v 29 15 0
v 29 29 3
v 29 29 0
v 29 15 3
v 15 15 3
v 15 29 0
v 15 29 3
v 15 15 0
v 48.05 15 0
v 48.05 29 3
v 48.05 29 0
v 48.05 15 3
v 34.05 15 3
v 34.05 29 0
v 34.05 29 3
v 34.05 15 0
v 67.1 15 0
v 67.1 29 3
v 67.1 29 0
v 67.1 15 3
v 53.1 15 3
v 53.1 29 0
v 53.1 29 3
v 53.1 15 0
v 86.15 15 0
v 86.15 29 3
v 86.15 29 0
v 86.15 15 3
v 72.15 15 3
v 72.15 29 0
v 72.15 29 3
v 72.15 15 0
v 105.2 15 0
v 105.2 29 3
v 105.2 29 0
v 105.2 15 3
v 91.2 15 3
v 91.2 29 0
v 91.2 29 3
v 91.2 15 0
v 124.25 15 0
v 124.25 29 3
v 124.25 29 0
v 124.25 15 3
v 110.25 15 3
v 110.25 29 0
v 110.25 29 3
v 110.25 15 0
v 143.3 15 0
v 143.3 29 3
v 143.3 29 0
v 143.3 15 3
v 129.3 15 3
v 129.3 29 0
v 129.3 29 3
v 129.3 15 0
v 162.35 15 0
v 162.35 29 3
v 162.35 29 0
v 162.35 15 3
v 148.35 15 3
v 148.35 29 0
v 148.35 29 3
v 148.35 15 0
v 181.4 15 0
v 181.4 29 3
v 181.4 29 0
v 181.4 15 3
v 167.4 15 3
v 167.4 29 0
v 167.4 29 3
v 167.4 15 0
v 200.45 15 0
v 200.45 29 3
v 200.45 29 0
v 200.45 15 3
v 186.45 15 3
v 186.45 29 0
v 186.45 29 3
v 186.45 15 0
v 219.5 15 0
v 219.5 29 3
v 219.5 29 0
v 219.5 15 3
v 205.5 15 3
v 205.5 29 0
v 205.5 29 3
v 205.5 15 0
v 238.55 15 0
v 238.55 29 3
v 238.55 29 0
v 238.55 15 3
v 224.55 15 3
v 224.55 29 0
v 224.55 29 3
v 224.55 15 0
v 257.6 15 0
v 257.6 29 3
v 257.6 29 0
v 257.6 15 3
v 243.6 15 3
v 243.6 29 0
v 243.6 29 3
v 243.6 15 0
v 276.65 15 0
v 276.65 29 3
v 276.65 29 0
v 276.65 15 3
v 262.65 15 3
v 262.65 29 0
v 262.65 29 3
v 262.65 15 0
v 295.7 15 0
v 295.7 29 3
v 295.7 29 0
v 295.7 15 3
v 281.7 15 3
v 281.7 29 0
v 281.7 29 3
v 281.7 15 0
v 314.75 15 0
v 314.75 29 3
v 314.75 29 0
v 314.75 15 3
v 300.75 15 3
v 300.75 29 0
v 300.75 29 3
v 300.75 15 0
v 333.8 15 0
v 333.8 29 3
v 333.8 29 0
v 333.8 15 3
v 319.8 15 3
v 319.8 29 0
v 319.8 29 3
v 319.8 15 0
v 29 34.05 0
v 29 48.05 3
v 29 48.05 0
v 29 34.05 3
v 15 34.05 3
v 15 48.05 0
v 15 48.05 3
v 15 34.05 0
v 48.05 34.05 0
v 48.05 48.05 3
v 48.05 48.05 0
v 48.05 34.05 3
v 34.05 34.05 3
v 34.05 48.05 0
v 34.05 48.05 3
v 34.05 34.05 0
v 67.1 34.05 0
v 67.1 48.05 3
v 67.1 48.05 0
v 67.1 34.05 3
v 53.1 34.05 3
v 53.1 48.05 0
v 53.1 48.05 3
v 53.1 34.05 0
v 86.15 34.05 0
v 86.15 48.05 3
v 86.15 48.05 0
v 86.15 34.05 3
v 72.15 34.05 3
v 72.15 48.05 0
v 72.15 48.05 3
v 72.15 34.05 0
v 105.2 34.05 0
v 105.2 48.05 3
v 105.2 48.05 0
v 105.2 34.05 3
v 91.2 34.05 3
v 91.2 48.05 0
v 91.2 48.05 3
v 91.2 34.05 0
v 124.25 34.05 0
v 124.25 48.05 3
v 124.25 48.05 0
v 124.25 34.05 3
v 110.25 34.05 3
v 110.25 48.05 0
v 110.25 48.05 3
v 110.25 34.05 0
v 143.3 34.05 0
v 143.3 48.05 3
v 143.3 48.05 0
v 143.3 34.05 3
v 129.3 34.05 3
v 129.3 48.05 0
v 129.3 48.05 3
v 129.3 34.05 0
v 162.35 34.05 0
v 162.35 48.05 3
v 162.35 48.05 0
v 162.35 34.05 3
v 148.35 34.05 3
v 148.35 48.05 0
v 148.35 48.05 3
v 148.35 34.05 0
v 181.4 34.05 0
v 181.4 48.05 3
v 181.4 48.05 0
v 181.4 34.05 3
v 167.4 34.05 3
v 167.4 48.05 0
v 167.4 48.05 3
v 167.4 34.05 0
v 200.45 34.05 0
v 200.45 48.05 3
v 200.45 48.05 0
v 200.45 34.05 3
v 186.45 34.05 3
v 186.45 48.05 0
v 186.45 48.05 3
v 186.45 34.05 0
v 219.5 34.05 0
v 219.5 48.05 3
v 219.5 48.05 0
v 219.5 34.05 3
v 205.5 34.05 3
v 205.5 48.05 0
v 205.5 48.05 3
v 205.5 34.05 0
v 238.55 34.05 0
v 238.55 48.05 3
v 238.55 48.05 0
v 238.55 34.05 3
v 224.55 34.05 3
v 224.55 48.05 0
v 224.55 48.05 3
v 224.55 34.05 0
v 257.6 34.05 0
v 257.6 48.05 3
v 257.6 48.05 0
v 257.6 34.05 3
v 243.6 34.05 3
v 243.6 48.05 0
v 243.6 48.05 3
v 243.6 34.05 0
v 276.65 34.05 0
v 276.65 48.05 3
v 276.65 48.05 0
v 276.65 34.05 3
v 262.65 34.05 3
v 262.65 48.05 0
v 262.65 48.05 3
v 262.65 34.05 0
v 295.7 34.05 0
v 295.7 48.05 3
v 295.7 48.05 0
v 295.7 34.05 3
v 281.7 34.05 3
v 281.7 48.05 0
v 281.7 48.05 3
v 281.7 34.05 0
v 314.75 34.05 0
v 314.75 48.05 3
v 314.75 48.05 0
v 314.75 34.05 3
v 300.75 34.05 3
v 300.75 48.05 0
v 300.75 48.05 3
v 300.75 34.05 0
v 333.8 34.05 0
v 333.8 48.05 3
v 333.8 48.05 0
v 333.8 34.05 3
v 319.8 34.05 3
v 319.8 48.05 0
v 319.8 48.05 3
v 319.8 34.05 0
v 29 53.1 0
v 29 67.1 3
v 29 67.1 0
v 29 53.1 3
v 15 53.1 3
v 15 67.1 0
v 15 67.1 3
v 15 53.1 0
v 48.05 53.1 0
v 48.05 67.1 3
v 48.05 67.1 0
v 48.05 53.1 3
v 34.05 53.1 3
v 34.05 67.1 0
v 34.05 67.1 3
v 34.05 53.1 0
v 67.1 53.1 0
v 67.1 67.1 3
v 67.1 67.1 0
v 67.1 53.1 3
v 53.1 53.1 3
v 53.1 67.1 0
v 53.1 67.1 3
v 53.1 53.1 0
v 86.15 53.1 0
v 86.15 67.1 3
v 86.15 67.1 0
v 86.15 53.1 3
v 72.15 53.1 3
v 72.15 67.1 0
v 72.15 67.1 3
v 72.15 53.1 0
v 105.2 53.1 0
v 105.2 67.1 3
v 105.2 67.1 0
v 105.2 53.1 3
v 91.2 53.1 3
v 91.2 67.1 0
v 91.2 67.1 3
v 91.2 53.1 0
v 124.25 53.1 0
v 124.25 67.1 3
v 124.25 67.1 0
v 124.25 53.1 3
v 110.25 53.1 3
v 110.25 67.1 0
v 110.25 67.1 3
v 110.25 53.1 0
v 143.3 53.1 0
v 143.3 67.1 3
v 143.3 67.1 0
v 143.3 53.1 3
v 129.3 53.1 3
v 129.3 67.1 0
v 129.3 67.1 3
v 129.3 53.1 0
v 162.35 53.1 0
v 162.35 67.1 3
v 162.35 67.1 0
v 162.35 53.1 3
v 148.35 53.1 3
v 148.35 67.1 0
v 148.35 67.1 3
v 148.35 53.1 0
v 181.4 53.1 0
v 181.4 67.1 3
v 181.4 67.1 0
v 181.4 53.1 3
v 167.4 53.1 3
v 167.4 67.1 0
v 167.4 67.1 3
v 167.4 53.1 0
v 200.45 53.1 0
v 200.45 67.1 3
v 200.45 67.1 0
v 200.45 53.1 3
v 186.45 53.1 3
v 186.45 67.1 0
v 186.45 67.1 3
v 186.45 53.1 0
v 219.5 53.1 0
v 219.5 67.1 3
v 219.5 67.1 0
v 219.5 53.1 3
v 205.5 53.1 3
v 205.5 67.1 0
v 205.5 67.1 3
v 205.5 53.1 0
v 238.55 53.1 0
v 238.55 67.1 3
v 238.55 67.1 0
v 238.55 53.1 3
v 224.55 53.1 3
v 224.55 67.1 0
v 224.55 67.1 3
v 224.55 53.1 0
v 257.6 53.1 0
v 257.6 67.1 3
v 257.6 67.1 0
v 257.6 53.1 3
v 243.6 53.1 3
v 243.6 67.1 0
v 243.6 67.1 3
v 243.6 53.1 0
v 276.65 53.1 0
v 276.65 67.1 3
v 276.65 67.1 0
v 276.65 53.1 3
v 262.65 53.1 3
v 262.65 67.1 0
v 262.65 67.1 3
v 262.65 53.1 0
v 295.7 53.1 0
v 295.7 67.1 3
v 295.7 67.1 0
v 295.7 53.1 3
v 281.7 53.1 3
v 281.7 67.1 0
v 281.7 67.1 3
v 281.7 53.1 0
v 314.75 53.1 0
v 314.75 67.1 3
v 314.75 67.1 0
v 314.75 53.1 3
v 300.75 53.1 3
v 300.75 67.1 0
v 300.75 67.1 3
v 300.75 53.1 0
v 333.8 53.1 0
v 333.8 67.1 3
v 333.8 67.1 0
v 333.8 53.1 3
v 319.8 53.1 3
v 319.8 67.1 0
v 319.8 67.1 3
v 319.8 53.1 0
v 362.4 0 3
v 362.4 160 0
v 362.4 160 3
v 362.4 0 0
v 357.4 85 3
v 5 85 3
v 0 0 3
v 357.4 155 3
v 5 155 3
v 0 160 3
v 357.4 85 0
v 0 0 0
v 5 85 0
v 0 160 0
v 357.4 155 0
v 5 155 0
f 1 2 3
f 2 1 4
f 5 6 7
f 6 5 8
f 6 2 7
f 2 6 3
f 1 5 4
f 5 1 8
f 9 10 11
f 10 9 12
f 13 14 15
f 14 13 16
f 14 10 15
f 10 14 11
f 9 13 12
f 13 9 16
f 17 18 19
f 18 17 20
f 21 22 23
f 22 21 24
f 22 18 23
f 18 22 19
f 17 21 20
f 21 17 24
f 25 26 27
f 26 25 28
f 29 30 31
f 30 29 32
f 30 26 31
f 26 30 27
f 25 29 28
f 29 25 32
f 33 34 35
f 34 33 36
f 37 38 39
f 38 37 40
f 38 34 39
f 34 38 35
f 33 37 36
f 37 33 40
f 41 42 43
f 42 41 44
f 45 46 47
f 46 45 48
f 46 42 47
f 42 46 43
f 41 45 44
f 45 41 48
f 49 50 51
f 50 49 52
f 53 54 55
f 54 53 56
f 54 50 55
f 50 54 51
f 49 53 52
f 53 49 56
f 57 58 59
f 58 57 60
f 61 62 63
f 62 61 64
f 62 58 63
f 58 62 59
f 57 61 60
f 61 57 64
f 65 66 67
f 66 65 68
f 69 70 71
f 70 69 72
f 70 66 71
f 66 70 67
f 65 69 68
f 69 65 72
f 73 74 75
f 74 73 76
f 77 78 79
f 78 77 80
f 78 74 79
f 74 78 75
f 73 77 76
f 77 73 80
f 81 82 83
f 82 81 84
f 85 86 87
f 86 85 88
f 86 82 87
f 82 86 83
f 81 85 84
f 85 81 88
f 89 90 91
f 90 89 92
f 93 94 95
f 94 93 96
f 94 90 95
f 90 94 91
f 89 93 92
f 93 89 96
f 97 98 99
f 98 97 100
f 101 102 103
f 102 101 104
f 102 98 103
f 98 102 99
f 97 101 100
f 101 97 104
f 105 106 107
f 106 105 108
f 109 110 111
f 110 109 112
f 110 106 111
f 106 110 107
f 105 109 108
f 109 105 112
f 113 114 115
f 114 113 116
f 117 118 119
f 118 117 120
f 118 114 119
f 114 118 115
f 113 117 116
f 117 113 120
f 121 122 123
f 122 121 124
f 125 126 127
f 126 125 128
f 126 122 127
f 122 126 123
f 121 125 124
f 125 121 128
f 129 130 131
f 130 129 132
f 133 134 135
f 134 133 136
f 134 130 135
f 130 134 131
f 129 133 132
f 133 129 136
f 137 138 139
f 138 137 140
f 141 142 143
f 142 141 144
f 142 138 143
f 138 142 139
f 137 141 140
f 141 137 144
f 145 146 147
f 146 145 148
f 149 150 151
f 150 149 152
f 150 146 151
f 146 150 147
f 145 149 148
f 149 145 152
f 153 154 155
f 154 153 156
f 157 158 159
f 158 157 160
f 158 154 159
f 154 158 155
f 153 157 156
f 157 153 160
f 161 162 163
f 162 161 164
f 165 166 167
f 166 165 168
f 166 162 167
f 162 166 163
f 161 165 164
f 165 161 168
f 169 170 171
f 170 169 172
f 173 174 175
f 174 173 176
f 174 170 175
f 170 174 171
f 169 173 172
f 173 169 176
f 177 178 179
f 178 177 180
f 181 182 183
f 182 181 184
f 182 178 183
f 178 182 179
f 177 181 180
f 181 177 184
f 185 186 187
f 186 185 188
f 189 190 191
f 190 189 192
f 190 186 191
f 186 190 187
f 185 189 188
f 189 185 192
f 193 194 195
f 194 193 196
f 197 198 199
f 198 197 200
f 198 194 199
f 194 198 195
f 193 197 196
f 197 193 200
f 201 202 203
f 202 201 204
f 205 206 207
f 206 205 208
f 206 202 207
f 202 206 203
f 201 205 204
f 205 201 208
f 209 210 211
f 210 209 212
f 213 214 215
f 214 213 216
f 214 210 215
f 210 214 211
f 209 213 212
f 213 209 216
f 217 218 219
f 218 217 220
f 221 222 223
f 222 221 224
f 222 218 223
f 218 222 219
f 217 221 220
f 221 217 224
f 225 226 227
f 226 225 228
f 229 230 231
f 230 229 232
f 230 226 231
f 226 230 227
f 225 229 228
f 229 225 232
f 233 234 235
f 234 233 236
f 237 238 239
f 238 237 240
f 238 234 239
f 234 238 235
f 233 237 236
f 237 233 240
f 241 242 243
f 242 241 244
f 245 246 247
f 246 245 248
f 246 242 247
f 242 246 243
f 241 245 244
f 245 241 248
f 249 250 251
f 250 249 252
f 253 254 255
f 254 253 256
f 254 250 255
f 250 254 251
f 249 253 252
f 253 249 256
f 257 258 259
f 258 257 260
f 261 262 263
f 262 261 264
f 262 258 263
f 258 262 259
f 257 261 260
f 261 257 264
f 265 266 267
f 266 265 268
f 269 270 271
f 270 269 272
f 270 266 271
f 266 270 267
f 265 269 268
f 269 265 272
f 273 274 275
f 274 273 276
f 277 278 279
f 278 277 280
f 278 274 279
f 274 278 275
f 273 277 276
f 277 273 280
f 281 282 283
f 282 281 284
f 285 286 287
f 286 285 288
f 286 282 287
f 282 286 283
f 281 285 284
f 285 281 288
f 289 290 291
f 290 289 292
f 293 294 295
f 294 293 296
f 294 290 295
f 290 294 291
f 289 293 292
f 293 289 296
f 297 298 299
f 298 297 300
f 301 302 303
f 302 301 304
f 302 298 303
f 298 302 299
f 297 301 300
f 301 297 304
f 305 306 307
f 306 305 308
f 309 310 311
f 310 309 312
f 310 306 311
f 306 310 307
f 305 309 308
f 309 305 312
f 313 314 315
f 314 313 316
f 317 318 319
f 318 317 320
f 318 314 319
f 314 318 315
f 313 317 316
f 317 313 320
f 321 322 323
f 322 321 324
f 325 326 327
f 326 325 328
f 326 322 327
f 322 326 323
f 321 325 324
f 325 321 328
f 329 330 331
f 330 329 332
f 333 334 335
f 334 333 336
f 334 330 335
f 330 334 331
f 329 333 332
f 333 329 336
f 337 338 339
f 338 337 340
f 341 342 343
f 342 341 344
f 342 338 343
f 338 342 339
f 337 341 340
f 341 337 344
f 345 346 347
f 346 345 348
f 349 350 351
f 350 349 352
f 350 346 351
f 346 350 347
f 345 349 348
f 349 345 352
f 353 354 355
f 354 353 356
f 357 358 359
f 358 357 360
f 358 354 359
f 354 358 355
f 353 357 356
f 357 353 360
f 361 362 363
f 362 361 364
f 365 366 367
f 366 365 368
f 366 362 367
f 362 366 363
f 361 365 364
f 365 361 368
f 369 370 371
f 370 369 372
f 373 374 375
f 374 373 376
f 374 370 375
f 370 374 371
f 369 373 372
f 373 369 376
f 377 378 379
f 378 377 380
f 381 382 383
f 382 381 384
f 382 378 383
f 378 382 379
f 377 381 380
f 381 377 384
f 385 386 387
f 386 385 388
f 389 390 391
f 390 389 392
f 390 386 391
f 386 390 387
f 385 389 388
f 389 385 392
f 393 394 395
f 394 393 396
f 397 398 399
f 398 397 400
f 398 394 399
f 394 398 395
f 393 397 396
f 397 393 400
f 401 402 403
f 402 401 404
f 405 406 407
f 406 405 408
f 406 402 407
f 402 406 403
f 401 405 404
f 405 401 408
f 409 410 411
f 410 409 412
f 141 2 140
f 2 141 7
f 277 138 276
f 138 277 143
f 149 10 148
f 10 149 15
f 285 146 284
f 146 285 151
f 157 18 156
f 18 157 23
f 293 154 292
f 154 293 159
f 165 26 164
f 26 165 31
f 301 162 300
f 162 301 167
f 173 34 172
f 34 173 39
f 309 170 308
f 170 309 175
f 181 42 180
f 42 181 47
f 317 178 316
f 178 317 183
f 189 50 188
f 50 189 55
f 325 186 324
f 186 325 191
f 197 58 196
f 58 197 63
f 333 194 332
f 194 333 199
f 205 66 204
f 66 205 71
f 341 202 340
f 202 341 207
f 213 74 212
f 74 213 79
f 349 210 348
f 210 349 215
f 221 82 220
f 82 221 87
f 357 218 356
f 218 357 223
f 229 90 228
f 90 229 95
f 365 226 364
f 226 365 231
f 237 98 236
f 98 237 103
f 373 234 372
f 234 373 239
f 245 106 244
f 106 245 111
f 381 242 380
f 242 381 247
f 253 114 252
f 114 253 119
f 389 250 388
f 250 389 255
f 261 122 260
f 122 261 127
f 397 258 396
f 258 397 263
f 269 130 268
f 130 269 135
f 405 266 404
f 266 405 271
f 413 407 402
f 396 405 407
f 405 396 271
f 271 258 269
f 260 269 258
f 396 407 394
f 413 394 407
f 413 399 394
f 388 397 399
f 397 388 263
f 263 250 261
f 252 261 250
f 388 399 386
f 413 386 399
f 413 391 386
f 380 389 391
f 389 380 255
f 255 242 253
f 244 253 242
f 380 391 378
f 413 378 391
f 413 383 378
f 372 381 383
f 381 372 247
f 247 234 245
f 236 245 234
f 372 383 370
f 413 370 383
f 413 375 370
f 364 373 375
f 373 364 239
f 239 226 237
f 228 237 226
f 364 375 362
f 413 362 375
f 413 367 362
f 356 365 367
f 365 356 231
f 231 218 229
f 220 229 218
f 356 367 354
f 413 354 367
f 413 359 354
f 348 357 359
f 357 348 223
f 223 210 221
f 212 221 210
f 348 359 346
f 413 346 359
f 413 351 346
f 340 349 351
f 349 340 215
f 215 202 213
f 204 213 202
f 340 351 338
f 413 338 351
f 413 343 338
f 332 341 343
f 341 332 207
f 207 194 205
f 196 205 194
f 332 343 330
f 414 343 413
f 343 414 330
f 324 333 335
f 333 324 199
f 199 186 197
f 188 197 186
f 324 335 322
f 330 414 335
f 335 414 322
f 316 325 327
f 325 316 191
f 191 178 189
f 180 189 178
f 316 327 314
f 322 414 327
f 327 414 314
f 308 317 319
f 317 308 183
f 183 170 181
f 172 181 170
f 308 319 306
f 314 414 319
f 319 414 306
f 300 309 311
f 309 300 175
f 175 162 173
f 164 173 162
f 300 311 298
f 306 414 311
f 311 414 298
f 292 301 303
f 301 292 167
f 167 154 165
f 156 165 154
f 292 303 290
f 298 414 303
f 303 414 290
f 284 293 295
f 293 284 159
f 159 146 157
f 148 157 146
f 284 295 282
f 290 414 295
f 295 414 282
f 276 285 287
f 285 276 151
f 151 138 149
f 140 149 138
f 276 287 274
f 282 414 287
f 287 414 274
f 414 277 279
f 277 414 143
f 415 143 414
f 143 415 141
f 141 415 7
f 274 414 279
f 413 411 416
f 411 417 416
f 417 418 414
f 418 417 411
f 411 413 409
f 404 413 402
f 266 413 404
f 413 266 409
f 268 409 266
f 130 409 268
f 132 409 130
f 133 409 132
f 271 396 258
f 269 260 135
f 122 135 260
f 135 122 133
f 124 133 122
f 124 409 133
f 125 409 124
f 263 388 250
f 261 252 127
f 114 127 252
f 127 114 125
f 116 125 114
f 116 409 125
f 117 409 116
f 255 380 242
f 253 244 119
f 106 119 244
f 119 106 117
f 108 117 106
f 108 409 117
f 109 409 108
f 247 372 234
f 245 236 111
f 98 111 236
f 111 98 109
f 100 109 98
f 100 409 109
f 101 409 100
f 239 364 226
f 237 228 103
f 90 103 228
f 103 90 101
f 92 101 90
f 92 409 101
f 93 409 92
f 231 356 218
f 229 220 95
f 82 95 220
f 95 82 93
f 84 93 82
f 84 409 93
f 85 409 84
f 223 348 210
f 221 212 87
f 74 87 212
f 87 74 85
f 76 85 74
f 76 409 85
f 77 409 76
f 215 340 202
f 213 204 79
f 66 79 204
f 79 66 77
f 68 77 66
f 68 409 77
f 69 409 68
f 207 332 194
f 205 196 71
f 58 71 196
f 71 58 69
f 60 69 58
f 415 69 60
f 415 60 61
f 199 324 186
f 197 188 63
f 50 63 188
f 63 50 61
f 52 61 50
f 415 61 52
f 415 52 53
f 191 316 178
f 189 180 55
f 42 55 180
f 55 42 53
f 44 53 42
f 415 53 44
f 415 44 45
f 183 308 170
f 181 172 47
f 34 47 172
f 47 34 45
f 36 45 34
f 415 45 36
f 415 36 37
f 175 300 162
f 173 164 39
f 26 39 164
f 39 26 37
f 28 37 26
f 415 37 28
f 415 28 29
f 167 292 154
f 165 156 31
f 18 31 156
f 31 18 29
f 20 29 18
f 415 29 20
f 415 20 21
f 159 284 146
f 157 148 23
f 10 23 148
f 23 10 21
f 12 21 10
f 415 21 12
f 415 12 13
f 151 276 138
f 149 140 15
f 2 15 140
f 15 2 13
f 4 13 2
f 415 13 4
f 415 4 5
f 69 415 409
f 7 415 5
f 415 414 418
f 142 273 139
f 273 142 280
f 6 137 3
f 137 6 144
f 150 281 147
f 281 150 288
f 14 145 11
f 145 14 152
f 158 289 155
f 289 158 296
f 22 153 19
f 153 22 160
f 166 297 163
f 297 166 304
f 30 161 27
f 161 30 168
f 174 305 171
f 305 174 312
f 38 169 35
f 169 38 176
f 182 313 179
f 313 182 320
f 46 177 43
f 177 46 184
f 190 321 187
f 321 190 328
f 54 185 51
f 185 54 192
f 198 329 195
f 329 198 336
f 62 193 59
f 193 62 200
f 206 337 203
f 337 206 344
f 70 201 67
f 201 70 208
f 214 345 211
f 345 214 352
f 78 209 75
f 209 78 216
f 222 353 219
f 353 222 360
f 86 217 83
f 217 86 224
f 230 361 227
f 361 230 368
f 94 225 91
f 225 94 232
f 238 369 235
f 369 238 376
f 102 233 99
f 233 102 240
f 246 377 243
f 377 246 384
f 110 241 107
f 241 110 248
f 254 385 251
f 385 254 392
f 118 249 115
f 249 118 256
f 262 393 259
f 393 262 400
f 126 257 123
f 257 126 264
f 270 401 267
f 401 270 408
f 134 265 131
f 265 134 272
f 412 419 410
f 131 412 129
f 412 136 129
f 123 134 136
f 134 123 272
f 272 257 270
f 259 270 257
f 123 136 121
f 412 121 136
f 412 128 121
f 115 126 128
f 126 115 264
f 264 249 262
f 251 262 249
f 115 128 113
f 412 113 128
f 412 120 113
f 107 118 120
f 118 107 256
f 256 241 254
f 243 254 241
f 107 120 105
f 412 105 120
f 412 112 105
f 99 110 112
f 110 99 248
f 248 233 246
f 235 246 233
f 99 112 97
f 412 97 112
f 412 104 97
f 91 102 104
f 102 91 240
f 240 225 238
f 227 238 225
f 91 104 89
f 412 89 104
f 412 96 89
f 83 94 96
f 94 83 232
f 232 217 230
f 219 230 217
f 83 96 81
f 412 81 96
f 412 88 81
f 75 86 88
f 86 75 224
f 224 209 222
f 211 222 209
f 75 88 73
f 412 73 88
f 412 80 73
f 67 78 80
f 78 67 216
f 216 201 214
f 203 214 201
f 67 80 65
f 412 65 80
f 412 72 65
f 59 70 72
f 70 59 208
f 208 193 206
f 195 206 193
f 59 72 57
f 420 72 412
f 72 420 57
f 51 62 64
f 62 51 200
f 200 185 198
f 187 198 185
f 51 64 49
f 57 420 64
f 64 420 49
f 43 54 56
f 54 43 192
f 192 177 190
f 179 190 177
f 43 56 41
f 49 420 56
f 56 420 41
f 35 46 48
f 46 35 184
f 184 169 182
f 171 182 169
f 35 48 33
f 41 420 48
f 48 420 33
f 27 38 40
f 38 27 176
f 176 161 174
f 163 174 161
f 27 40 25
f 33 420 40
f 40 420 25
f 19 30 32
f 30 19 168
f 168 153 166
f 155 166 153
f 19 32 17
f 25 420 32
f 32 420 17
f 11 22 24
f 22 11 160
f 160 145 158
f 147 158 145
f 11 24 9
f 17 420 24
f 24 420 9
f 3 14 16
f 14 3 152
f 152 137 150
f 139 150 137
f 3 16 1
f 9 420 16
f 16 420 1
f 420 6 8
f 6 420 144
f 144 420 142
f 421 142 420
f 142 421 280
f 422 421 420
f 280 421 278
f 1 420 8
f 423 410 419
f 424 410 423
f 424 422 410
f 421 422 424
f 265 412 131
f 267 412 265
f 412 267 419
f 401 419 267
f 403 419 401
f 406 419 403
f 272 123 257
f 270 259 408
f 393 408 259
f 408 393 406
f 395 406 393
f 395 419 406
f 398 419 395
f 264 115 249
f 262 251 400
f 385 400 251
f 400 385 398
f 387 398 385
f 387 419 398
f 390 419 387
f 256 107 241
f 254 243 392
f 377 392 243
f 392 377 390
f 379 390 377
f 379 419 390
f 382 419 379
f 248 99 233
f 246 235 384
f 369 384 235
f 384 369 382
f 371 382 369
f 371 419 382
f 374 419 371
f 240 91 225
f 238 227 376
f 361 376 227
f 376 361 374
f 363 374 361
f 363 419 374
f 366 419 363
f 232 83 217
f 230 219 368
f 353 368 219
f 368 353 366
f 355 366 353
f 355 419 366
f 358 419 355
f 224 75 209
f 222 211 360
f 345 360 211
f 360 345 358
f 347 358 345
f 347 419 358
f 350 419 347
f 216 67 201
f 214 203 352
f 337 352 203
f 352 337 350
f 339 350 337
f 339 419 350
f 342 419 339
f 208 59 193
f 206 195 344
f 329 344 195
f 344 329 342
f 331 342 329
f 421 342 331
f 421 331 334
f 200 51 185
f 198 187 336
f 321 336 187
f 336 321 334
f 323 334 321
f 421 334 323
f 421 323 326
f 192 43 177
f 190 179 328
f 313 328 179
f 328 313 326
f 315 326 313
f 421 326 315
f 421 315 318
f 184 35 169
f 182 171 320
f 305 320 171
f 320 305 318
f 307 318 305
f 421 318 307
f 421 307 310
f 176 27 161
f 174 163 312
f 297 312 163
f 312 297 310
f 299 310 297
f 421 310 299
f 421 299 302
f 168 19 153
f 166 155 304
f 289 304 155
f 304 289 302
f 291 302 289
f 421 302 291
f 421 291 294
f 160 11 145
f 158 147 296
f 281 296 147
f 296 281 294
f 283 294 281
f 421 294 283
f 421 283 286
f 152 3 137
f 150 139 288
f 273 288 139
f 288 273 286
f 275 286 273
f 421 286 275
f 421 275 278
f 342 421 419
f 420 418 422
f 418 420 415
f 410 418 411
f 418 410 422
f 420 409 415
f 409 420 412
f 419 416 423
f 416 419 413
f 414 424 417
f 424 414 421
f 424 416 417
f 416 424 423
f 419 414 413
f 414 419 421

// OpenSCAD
// 14.5" Cyberdeck Switch Plate (1U Grid)
u = 19.05; // Standard Unit Spacing
hole = 14.0; // Switch Cutout

module switch_grid(rows, cols) {
    for (r = [0 : rows-1]) {
        for (c = [0 : cols-1]) {
            translate([c*u, r*u, -1])
                cube([hole, hole, 5]);
        }
    }
}

difference() {
    // Main Lid Surface
    cube([362.4, 160, 3]); 
    
    // Aligned to leave room for the 14.5" screen at the top
    translate([15, 15, 0]) switch_grid(3, 17); 
    
    // Screen Cutout (2560x720 window)
    translate([5, 85, -1]) cube([352.4, 70, 5]);
}
